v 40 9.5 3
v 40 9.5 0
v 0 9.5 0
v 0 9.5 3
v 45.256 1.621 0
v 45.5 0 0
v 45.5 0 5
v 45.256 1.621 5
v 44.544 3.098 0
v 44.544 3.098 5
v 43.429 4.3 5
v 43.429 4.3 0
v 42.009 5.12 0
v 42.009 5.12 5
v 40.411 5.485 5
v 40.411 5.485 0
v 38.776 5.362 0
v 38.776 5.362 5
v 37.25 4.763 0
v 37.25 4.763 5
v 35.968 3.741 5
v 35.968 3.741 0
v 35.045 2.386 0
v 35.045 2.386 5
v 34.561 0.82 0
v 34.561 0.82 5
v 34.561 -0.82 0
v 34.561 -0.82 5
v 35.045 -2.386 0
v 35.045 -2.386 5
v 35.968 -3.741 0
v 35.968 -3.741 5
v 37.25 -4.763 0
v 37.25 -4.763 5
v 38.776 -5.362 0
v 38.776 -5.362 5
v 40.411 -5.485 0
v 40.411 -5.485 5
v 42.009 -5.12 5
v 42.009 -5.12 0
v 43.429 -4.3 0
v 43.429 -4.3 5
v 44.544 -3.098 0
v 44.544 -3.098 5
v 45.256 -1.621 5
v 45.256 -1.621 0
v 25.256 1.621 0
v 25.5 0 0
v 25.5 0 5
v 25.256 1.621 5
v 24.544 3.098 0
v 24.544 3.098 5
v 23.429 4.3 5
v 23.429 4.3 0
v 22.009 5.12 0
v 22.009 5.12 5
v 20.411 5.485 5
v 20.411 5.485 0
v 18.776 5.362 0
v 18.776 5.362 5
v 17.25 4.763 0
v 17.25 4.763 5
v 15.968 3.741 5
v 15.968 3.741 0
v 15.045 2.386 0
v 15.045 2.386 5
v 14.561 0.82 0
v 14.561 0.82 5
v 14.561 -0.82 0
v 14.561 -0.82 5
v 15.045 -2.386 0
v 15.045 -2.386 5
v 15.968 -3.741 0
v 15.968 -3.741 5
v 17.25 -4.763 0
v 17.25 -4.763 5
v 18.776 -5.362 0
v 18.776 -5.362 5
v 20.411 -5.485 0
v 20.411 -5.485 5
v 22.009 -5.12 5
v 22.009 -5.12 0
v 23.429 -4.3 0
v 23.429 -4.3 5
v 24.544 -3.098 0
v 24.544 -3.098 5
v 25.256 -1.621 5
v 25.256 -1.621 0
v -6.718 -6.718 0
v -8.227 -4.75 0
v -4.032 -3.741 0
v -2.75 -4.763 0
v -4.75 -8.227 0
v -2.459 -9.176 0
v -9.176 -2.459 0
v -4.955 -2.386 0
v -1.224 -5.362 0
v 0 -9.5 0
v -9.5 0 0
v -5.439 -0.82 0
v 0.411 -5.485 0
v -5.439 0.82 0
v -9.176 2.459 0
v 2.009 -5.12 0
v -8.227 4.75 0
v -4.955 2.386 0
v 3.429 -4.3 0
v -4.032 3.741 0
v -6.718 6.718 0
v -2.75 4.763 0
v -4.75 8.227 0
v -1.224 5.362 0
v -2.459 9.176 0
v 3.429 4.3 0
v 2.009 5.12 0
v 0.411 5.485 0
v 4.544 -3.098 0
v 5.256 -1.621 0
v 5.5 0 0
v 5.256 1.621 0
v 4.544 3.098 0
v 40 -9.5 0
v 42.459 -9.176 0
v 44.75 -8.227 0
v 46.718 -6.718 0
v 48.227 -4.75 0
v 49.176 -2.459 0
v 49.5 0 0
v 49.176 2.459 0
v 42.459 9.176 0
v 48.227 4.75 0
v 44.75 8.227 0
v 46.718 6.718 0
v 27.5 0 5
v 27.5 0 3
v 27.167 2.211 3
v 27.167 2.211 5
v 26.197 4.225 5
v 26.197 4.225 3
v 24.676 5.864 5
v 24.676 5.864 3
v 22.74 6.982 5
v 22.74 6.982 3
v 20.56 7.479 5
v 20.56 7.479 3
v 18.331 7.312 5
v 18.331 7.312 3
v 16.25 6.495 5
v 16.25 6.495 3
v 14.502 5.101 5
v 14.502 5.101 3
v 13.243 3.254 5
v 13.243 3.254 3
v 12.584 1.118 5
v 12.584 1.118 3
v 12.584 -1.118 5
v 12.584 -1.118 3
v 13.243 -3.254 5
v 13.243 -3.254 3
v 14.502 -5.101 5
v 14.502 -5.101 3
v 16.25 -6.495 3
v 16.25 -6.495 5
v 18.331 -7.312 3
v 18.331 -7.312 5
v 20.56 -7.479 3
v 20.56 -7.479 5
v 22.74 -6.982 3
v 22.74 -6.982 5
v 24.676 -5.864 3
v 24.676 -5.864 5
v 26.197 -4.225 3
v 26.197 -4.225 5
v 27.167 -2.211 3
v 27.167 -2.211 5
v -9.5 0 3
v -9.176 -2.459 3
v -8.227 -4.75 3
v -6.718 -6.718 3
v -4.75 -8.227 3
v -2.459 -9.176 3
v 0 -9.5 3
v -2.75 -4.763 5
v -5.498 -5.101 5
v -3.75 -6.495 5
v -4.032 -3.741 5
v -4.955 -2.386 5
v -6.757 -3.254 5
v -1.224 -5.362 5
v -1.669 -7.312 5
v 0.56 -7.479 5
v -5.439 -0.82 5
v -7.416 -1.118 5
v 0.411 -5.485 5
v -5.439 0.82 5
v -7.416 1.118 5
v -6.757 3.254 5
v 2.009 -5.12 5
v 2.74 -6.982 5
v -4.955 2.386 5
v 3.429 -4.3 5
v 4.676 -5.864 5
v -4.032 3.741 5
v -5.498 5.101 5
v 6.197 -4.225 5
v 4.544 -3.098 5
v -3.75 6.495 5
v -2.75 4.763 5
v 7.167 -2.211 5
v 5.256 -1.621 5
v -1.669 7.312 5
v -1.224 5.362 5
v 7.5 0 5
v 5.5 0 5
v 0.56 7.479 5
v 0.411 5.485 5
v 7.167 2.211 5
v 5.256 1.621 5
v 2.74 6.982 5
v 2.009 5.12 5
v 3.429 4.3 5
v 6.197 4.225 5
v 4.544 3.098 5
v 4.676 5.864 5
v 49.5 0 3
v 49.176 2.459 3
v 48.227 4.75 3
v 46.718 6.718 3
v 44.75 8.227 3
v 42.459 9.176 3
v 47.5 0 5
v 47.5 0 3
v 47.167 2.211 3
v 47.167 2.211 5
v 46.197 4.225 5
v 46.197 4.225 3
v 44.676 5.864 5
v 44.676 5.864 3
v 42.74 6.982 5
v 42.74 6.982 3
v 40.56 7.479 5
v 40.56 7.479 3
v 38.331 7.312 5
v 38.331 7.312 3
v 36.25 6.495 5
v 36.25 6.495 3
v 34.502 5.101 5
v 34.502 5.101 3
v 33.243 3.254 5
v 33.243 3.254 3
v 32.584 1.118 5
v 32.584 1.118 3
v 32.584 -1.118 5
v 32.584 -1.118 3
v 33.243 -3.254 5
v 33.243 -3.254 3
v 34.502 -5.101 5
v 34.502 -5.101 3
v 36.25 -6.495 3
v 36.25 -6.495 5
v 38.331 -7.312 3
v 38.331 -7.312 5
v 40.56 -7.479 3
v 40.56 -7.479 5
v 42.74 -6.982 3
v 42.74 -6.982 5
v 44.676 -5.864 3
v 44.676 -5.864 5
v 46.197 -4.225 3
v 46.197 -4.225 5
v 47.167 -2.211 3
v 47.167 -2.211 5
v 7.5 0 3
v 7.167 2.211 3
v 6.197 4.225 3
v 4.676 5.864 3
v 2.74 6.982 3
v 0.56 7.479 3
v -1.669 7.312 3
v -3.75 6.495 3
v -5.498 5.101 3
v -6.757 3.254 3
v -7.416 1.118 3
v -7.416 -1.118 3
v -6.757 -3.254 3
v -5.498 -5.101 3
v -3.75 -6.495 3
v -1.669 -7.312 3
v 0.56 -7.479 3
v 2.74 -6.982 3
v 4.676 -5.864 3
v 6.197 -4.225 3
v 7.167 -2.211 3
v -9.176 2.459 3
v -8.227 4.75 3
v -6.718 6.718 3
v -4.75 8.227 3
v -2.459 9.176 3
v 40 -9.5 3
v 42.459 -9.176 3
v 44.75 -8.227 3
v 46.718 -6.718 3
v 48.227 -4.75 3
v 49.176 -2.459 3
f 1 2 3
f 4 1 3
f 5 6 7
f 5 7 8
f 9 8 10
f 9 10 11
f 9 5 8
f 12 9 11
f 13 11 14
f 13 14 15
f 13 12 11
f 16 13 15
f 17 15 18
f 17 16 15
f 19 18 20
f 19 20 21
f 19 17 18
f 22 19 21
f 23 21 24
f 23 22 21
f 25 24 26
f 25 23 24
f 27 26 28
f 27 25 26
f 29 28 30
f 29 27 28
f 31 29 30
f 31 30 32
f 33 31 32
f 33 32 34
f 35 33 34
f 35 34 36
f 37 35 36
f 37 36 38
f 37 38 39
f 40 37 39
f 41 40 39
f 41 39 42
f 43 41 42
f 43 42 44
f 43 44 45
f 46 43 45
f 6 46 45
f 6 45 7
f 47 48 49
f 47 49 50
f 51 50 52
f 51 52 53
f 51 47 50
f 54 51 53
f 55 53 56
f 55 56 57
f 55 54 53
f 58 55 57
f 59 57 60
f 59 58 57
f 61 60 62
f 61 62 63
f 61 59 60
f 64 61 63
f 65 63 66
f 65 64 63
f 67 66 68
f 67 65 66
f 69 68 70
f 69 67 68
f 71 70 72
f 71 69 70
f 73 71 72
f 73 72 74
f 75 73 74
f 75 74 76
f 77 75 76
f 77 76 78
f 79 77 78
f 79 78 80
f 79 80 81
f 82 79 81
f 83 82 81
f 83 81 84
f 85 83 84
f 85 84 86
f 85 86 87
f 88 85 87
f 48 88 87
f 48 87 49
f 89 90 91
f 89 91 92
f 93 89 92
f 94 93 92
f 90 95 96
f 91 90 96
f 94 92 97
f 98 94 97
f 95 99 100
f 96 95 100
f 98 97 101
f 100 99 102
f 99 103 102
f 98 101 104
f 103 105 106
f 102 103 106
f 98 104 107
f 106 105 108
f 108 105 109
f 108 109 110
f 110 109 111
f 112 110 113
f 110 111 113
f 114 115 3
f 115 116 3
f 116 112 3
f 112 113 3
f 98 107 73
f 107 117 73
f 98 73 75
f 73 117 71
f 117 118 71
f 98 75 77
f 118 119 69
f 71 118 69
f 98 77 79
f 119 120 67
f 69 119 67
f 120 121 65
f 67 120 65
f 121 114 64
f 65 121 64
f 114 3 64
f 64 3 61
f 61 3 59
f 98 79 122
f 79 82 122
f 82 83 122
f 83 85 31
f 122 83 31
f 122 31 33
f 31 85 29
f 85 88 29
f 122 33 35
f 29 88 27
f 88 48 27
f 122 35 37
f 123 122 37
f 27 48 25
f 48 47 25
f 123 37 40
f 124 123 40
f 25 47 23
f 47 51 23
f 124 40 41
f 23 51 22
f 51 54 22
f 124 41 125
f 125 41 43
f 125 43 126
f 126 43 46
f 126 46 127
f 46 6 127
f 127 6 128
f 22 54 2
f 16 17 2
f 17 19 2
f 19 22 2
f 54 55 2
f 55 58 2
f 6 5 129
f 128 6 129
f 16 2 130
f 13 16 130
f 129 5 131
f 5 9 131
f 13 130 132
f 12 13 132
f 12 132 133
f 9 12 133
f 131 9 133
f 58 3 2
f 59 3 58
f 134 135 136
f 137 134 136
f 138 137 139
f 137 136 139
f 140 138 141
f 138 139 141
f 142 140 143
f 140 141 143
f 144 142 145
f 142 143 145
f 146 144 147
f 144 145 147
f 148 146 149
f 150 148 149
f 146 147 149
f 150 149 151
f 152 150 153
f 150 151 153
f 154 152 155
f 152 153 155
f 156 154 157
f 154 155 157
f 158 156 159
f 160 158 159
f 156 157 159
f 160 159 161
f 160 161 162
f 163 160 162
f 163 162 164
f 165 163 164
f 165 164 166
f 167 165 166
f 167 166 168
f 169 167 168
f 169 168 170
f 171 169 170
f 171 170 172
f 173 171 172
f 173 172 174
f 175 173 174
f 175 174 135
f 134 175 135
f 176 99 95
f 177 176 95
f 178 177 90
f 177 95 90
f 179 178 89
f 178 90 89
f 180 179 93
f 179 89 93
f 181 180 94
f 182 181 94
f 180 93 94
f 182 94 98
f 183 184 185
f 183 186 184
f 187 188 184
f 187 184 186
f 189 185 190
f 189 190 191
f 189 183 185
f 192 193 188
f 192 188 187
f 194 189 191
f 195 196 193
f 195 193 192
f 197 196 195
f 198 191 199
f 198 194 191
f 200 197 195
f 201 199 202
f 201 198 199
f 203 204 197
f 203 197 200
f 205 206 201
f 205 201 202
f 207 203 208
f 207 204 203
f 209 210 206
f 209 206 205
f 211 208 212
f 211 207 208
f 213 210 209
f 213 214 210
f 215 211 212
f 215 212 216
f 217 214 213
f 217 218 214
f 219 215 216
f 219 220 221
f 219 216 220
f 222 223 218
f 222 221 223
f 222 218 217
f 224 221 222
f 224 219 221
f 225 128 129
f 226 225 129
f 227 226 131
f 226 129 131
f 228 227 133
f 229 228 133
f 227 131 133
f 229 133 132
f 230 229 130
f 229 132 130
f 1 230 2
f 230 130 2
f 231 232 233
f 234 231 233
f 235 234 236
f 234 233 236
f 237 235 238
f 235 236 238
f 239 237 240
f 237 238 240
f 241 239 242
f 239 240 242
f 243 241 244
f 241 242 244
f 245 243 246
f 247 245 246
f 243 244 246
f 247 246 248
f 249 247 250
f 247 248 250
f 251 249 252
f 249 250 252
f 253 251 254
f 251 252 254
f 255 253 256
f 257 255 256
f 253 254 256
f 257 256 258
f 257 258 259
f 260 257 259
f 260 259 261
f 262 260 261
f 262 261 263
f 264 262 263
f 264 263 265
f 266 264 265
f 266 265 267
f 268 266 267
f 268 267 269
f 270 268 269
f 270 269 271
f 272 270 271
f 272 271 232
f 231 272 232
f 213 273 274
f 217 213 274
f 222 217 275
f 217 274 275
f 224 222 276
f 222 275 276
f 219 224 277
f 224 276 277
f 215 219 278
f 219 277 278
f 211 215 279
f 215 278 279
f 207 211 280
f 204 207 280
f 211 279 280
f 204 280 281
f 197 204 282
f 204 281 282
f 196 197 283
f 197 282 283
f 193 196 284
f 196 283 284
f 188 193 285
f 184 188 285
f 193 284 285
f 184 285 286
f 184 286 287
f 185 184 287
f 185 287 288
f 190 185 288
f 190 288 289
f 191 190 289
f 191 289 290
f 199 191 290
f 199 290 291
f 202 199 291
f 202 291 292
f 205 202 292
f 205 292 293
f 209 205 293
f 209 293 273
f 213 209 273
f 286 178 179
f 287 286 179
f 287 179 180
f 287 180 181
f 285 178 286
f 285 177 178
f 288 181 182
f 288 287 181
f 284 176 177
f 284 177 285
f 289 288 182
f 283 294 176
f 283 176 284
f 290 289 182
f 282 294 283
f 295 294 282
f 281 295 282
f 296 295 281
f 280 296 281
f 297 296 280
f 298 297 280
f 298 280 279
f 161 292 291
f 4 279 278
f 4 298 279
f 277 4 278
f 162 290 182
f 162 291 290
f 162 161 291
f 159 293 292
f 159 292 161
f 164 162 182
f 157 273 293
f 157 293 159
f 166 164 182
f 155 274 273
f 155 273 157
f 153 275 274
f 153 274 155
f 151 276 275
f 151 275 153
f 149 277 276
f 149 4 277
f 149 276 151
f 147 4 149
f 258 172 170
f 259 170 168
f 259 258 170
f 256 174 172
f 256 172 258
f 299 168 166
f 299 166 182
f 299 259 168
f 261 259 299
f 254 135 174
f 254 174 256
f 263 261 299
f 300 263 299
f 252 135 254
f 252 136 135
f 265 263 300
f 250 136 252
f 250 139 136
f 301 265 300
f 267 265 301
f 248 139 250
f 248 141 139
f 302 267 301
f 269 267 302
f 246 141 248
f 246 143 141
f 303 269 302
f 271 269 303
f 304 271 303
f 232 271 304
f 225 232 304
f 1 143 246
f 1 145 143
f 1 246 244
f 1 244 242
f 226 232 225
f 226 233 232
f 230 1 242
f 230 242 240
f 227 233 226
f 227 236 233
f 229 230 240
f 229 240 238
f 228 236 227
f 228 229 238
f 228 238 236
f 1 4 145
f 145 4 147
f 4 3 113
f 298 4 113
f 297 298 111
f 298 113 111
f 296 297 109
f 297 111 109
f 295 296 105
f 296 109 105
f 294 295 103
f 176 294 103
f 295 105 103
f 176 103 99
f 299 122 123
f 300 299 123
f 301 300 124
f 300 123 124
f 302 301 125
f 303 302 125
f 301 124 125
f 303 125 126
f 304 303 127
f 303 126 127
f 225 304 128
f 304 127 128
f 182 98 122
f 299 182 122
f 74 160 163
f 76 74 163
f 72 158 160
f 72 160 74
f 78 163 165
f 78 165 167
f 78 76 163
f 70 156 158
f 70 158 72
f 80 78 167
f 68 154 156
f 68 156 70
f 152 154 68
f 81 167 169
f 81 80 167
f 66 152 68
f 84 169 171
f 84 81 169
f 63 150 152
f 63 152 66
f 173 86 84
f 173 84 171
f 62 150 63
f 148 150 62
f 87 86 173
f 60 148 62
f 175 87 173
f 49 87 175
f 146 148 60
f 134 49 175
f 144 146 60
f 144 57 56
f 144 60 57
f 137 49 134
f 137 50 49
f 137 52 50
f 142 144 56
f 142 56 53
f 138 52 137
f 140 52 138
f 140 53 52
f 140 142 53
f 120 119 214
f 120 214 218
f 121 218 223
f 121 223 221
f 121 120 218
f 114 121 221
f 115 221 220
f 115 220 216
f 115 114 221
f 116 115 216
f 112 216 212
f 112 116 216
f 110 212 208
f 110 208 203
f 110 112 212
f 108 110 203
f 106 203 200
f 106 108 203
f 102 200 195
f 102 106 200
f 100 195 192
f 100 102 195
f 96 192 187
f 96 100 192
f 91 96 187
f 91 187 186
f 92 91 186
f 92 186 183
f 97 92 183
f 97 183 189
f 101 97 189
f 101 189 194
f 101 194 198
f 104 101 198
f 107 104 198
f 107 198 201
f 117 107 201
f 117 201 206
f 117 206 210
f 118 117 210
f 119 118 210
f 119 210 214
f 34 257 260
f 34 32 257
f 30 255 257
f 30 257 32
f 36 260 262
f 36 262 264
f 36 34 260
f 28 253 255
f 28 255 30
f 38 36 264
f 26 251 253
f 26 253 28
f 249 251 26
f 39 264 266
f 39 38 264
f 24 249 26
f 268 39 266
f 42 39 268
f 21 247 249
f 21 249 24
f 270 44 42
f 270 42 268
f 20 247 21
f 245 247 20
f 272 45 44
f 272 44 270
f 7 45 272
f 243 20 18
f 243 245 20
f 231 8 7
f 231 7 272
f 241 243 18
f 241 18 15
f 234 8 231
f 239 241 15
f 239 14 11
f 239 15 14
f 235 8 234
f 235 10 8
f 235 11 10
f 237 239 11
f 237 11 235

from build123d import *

# Parameters (mm, degrees)
F2_R     = 7.5
F2_R_2   = 5.5
F3_DEPTH = 3
F4_DEPTH = 5


# Not quite as in the source:
# - a feature names something its author has since deleted; it is built from what else it names


with BuildPart() as f3:
    # F2 (on Top) → F3 (new body)
    with BuildSketch(Plane.XY):
        with BuildLine():
            Line((40, 9.5), (0, 9.5))
            ThreePointArc((0, 9.5), (-6.7175144213, 6.7175144213), (-9.5, 0))
            ThreePointArc((-9.5, 0), (-6.7175144213, -6.7175144213), (0, -9.5))
            Line((0, -9.5), (40, -9.5))
            ThreePointArc((40, -9.5), (46.7175144213, -6.7175144213), (49.5, 0))
            ThreePointArc((49.5, 0), (46.7175144213, 6.7175144213), (40, 9.5))
        make_face()
        Circle(F2_R, mode=Mode.SUBTRACT)
        with Locations((20, 0)):
            Circle(F2_R, mode=Mode.SUBTRACT)
        with Locations((40, 0)):
            Circle(F2_R, mode=Mode.SUBTRACT)
        Circle(F2_R)
        Circle(F2_R_2, mode=Mode.SUBTRACT)
        with Locations((20, 0)):
            Circle(F2_R)
        with Locations((20, 0)):
            Circle(F2_R_2, mode=Mode.SUBTRACT)
        with Locations((40, 0)):
            Circle(F2_R)
        with Locations((40, 0)):
            Circle(F2_R_2, mode=Mode.SUBTRACT)
    extrude(amount=F3_DEPTH)

    # F2 (on Top) → F4 (join)
    with BuildSketch(Plane.XY):
        Circle(F2_R)
        Circle(F2_R_2, mode=Mode.SUBTRACT)
        with Locations((20, 0)):
            Circle(F2_R)
        with Locations((20, 0)):
            Circle(F2_R_2, mode=Mode.SUBTRACT)
        with Locations((40, 0)):
            Circle(F2_R)
        with Locations((40, 0)):
            Circle(F2_R_2, mode=Mode.SUBTRACT)
    extrude(amount=F4_DEPTH)


solid = f3.part
